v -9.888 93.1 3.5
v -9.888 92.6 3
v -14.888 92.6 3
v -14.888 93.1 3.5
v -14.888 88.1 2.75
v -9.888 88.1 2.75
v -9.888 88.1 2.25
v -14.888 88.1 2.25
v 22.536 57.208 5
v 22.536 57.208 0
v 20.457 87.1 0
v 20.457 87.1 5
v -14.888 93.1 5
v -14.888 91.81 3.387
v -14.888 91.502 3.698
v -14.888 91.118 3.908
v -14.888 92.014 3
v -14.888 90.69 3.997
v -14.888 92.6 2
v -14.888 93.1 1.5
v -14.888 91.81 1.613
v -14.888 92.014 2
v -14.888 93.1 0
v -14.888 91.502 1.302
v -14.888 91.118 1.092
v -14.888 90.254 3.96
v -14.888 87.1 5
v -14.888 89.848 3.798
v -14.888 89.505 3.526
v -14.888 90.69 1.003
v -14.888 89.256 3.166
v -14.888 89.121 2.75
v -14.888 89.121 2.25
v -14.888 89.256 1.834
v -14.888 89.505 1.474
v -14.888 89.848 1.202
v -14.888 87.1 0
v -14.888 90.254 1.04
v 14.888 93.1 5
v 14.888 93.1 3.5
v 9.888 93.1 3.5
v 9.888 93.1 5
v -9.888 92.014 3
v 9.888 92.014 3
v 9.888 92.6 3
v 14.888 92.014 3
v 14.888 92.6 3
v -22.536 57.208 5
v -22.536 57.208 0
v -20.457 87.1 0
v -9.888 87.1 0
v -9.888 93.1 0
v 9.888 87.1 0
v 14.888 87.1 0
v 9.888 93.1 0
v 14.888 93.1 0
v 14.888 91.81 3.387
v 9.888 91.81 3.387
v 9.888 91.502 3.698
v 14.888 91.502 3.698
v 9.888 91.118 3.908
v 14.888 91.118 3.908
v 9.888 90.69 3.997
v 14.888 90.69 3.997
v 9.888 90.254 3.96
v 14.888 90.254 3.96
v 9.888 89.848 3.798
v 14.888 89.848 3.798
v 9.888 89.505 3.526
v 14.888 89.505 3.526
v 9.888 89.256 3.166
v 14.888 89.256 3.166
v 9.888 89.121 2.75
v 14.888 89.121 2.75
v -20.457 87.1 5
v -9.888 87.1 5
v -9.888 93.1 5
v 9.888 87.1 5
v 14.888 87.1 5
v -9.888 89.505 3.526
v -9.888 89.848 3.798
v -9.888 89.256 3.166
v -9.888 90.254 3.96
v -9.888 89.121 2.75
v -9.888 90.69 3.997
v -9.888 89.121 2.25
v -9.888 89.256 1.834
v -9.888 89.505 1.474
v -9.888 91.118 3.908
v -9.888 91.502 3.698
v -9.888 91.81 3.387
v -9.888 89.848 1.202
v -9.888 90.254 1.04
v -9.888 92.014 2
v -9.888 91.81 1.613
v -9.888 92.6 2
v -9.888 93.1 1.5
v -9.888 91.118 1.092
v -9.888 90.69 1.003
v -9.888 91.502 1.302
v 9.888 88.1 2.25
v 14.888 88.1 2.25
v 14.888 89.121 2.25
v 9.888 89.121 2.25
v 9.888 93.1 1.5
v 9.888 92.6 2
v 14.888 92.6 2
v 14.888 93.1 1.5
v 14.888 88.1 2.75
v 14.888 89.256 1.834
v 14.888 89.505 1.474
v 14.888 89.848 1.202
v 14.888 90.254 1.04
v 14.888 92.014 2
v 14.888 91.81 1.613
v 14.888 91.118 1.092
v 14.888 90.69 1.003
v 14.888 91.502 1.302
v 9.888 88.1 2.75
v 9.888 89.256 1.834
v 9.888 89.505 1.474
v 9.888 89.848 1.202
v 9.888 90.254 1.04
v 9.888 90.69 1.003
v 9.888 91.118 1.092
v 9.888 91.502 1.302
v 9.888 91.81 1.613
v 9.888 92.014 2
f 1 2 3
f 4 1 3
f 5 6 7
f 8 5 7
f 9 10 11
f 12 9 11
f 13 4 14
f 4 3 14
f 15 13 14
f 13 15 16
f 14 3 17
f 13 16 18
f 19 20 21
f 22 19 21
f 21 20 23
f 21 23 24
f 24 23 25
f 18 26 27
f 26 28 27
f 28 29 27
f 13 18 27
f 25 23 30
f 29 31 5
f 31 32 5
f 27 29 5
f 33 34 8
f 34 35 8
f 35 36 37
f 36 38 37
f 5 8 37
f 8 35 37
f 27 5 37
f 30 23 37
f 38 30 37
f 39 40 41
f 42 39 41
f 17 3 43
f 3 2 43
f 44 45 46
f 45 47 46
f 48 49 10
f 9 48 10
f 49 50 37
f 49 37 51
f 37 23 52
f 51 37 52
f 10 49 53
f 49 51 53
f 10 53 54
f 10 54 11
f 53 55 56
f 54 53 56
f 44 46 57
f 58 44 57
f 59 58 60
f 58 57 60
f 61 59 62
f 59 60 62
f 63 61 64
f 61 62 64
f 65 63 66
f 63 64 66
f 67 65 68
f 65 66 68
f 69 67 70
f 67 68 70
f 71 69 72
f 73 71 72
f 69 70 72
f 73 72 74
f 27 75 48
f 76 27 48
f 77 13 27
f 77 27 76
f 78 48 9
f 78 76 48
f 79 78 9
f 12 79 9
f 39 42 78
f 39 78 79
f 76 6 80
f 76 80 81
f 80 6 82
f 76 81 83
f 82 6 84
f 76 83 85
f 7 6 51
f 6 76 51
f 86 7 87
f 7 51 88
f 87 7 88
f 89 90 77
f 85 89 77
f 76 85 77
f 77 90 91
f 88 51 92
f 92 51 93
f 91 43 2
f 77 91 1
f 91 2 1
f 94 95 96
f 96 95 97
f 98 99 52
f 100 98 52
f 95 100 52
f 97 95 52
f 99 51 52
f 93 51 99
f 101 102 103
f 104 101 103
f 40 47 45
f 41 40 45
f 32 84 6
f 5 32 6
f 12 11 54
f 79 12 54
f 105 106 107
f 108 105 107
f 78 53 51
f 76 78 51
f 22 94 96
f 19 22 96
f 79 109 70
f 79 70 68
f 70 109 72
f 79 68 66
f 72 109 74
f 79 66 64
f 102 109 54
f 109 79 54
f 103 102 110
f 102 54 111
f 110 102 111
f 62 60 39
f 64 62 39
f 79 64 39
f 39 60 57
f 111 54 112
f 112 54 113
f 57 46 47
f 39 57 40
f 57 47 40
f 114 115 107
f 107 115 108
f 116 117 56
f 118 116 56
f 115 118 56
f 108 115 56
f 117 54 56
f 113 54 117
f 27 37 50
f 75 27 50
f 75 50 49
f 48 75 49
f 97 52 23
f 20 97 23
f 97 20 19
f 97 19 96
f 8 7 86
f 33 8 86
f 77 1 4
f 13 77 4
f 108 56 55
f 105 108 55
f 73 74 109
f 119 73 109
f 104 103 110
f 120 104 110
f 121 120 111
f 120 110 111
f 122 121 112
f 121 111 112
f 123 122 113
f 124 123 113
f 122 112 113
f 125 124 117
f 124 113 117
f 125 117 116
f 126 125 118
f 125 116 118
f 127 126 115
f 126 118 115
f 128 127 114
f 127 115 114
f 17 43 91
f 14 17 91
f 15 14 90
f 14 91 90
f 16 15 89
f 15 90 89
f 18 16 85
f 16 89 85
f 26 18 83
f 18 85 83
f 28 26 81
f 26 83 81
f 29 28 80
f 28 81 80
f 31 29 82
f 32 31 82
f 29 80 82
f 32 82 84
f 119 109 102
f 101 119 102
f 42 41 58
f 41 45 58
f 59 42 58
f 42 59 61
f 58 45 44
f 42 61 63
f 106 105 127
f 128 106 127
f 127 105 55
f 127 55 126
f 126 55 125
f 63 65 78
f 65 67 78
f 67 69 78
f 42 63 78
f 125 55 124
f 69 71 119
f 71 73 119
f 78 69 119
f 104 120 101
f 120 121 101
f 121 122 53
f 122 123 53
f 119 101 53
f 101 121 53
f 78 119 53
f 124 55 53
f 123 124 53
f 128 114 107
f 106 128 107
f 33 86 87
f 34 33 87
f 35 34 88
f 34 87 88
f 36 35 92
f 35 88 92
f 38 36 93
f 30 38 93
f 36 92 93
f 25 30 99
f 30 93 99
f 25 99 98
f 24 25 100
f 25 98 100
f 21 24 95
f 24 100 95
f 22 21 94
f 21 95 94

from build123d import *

# Parameters (mm, degrees)
F1_DEPTH = 5
F4_DEPTH = 45.5
F5_SIZE  = 0.5


with BuildPart() as f1:
    # F0 (on Top) → F1 (new body)
    with BuildSketch(Plane.XY):
        Polygon((-14.8876575074, 87.1), (-20.4571957112, 87.1), (-22.5358384183, 57.2079033579), (22.5358384183, 57.2079033579), (20.4571957112, 87.1), (14.8876575074, 87.1), (14.8876575074, 93.1), (9.8876575074, 93.1), (9.8876575074, 87.1), (-9.8876575074, 87.1), (-9.8876575074, 93.1), (-14.8876575074, 93.1), align=None)
    extrude(amount=F1_DEPTH)

    # F3 (on offset) → F4 (cut)
    with BuildSketch(Plane.YZ.offset(24.8876575074)):
        with BuildLine():
            Line((95.6, 3), (92.0142135624, 3))
            ThreePointArc((92.0142135624, 3), (90.4708684127, 3.9944313411), (89.1209800542, 2.75))
            Line((89.1209800542, 2.75), (88.1, 2.75))
            Line((88.1, 2.75), (88.1, 2.25))
            Line((88.1, 2.25), (89.1209800542, 2.25))
            ThreePointArc((89.1209800542, 2.25), (90.4708684127, 1.0055686589), (92.0142135624, 2))
            Line((92.0142135624, 2), (95.6, 2))
            Line((95.6, 2), (95.6, 3))
        make_face()
    extrude(amount=-F4_DEPTH, mode=Mode.SUBTRACT)

    # F5
    f5_edges = [f1.edges().sort_by_distance(p)[0] for p in [
        (-12.387658, 93.1, 3),
        (-12.387658, 93.1, 2),
        (12.387658, 93.1, 3),
        (12.387658, 93.1, 2),
    ]]
    chamfer(f5_edges, length=F5_SIZE)


solid = f1.part
